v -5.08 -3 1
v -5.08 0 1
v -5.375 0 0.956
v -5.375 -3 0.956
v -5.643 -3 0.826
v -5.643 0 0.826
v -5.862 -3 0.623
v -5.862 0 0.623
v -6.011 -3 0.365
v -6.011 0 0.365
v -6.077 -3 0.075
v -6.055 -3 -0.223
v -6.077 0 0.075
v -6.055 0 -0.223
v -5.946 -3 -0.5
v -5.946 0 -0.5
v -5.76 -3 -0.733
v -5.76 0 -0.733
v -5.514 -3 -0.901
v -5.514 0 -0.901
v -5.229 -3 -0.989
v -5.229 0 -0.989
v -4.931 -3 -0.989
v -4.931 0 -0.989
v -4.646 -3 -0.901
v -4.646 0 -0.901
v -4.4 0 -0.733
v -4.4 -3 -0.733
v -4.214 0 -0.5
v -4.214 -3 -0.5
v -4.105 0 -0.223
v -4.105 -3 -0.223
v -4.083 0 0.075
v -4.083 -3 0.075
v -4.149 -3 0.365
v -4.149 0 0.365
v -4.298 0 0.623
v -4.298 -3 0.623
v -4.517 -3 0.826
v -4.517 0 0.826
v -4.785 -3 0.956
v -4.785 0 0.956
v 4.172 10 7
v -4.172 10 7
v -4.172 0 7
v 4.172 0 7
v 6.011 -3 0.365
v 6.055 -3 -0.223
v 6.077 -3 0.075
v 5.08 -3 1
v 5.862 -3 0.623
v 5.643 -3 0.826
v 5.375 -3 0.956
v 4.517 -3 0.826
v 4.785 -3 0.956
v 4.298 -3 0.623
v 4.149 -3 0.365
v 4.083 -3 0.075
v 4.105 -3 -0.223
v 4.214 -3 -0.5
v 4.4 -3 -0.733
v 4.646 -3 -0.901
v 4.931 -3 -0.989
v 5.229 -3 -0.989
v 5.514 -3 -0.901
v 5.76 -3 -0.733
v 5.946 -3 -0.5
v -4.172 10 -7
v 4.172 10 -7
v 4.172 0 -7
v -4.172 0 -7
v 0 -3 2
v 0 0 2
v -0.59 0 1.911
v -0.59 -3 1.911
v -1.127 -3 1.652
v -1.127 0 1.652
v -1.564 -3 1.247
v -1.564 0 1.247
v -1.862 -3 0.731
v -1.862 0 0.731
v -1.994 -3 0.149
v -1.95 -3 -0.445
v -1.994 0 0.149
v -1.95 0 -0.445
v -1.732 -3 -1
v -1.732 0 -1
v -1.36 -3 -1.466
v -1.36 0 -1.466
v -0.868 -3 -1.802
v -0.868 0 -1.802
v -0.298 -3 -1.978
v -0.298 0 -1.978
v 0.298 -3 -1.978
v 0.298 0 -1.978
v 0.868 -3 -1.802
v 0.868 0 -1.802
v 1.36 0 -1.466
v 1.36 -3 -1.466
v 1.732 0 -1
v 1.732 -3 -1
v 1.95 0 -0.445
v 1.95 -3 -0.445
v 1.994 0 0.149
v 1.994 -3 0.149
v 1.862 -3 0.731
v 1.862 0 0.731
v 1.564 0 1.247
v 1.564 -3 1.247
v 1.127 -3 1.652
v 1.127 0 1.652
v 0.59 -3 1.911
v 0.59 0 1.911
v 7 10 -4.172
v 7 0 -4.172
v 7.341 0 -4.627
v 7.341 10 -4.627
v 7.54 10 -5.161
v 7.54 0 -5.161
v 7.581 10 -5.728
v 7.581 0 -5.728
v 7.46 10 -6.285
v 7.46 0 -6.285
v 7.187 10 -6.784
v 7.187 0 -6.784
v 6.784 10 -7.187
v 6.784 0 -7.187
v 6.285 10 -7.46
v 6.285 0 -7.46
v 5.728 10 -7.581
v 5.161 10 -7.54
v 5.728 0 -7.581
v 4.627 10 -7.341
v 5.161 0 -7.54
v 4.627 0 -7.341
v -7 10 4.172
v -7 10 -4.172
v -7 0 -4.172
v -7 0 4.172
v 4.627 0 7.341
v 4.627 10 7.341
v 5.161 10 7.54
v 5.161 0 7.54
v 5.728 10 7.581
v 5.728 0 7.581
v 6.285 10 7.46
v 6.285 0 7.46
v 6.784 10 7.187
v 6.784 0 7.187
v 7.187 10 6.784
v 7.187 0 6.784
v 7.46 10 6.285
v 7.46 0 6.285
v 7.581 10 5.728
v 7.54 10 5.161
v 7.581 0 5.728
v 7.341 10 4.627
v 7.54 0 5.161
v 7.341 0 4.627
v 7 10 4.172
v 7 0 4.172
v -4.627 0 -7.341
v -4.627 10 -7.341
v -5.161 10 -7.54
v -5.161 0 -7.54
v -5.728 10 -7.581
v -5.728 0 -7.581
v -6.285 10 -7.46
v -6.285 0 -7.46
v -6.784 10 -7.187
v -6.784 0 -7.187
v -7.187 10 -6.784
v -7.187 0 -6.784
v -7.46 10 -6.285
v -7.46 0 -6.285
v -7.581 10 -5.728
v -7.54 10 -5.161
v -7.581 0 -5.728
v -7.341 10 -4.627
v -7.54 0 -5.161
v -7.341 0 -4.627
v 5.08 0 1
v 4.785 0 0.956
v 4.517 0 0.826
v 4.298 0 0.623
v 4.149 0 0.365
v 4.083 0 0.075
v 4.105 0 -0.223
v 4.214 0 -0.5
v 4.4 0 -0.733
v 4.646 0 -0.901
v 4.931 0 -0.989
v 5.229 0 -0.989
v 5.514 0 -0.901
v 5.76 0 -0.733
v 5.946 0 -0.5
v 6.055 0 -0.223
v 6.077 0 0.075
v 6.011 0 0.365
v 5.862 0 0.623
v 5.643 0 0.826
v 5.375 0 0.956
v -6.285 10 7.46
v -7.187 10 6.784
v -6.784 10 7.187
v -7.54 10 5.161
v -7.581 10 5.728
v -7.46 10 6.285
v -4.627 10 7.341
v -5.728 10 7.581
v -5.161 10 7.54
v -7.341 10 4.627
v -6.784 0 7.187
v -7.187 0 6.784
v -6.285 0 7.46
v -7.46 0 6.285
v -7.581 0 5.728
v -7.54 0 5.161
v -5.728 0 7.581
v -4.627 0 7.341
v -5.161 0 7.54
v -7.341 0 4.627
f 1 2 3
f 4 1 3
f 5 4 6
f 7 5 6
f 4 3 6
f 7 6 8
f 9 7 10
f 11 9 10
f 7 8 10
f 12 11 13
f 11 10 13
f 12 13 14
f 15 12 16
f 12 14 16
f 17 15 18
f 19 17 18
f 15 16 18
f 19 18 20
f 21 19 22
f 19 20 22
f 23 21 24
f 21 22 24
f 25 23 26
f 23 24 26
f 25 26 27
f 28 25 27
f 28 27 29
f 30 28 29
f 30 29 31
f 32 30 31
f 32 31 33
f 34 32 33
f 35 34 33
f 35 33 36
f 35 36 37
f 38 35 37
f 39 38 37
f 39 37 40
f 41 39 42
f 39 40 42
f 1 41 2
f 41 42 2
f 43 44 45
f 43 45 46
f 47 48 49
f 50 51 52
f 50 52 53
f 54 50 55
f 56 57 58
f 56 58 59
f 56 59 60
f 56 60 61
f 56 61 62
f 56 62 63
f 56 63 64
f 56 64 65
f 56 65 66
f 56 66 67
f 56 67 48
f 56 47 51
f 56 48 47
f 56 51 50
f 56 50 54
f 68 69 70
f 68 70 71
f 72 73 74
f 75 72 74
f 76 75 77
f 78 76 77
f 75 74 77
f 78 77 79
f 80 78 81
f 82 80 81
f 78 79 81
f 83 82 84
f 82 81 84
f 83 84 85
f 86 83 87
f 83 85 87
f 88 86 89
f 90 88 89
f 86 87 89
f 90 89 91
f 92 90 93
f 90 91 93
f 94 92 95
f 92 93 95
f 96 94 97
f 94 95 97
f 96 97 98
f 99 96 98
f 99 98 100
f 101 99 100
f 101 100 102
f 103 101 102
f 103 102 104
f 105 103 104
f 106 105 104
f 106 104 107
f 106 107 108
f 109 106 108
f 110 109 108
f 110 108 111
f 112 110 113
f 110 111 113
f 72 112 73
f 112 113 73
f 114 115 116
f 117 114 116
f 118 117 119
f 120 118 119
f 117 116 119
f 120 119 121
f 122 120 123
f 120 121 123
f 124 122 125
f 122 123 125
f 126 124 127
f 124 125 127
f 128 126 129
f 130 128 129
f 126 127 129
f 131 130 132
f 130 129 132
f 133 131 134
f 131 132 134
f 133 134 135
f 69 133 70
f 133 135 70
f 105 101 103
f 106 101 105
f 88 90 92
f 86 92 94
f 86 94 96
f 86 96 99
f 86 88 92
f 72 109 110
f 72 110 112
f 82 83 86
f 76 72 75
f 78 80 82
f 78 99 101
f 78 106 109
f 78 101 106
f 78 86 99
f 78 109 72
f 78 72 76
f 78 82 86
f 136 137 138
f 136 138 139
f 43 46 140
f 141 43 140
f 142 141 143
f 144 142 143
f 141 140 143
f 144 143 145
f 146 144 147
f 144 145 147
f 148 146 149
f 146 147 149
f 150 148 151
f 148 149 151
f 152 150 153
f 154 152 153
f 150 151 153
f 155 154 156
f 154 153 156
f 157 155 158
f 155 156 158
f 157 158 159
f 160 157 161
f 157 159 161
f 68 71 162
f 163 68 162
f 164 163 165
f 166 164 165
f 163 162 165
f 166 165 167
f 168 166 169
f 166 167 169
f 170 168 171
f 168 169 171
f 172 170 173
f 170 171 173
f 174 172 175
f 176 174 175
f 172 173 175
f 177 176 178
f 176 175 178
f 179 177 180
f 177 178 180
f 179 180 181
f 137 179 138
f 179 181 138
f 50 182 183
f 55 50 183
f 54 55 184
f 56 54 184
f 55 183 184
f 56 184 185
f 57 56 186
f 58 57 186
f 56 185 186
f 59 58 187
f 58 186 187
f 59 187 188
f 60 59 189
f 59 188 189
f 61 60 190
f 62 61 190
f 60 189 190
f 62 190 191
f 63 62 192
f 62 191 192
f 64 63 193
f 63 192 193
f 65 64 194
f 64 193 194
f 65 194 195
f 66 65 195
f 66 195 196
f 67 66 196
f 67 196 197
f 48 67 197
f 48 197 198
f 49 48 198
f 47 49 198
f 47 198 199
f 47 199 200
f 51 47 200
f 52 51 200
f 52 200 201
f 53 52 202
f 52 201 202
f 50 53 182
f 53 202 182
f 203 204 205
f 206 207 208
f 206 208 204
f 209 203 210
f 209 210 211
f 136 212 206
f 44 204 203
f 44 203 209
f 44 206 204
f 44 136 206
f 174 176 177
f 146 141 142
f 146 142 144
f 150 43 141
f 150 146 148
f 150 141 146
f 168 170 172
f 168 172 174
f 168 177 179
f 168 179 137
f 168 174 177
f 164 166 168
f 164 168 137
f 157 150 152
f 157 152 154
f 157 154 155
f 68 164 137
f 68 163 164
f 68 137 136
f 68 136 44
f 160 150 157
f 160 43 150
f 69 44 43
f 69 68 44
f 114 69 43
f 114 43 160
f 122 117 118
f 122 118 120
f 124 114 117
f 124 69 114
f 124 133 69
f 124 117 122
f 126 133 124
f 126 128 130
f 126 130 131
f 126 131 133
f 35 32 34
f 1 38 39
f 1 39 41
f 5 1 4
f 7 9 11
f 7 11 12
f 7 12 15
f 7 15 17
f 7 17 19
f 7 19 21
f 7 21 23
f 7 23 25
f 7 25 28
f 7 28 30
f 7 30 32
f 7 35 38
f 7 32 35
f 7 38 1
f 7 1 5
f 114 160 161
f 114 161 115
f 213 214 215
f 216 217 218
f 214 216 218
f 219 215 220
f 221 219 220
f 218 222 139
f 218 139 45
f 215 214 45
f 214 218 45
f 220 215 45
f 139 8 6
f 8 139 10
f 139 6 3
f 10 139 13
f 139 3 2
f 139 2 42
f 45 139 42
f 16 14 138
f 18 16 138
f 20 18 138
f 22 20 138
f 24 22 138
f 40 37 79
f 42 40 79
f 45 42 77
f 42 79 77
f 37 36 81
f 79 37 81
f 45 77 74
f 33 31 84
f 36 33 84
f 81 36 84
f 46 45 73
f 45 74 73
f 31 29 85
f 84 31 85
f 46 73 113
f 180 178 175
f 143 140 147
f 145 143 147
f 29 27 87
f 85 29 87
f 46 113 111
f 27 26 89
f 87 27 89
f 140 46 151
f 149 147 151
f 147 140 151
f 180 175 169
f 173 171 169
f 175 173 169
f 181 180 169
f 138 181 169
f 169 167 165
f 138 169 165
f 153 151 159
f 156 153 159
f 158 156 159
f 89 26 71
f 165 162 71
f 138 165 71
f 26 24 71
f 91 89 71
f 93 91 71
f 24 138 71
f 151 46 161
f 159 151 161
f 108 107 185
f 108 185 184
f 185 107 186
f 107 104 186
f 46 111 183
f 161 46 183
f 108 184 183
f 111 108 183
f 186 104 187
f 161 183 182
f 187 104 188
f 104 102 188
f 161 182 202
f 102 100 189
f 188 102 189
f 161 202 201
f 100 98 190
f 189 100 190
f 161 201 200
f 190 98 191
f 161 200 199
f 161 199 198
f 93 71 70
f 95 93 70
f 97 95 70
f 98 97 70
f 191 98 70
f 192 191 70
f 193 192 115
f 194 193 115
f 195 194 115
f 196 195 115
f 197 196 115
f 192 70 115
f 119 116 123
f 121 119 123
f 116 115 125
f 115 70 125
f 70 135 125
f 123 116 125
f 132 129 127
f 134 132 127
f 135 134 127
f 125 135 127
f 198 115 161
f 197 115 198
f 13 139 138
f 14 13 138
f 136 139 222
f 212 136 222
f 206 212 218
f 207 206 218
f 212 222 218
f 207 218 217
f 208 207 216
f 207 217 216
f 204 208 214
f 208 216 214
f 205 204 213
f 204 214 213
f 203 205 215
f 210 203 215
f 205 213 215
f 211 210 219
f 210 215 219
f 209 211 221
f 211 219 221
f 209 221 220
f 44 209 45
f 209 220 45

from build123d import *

# Parameters (mm, degrees)
BOSS_EXTRUDE1_DEPTH = 10
SKETCH2_R           = 2
SKETCH2_R_2         = 1
BOSS_EXTRUDE2_DEPTH = 3


with BuildPart() as part:
    # Sketch1 → Boss-Extrude1 (new body)
    with BuildSketch(Plane(origin=(0, 0, 0), x_dir=(1, 0, 0), z_dir=(0, 1, 0))):
        with BuildLine():
            Line((-4.171572875, -7), (4.171572875, -7))
            ThreePointArc((4.171572875, -7), (7, -7), (7, -4.171572875))
            Line((7, -4.171572875), (7, 4.171572875))
            ThreePointArc((7, 4.171572875), (7, 7), (4.171572875, 7))
            Line((4.171572875, 7), (-4.171572875, 7))
            ThreePointArc((-4.171572875, 7), (-7, 7), (-7, 4.171572875))
            Line((-7, 4.171572875), (-7, -4.171572875))
            ThreePointArc((-7, -4.171572875), (-7, -7), (-4.171572875, -7))
        make_face()
    extrude(amount=BOSS_EXTRUDE1_DEPTH)

    # Sketch2 → Boss-Extrude2 (add)
    with BuildSketch(Plane.XZ):
        with Locations(Location((0, 0, 0), (0, 0, 90))):
            Circle(SKETCH2_R)
        with Locations(Location((-5.08, 0, 0), (0, 0, 90))):
            Circle(SKETCH2_R_2)
        with Locations(Location((5.08, 0, 0), (0, 0, 90))):
            Circle(SKETCH2_R_2)
    extrude(amount=BOSS_EXTRUDE2_DEPTH)


solid = part.part
